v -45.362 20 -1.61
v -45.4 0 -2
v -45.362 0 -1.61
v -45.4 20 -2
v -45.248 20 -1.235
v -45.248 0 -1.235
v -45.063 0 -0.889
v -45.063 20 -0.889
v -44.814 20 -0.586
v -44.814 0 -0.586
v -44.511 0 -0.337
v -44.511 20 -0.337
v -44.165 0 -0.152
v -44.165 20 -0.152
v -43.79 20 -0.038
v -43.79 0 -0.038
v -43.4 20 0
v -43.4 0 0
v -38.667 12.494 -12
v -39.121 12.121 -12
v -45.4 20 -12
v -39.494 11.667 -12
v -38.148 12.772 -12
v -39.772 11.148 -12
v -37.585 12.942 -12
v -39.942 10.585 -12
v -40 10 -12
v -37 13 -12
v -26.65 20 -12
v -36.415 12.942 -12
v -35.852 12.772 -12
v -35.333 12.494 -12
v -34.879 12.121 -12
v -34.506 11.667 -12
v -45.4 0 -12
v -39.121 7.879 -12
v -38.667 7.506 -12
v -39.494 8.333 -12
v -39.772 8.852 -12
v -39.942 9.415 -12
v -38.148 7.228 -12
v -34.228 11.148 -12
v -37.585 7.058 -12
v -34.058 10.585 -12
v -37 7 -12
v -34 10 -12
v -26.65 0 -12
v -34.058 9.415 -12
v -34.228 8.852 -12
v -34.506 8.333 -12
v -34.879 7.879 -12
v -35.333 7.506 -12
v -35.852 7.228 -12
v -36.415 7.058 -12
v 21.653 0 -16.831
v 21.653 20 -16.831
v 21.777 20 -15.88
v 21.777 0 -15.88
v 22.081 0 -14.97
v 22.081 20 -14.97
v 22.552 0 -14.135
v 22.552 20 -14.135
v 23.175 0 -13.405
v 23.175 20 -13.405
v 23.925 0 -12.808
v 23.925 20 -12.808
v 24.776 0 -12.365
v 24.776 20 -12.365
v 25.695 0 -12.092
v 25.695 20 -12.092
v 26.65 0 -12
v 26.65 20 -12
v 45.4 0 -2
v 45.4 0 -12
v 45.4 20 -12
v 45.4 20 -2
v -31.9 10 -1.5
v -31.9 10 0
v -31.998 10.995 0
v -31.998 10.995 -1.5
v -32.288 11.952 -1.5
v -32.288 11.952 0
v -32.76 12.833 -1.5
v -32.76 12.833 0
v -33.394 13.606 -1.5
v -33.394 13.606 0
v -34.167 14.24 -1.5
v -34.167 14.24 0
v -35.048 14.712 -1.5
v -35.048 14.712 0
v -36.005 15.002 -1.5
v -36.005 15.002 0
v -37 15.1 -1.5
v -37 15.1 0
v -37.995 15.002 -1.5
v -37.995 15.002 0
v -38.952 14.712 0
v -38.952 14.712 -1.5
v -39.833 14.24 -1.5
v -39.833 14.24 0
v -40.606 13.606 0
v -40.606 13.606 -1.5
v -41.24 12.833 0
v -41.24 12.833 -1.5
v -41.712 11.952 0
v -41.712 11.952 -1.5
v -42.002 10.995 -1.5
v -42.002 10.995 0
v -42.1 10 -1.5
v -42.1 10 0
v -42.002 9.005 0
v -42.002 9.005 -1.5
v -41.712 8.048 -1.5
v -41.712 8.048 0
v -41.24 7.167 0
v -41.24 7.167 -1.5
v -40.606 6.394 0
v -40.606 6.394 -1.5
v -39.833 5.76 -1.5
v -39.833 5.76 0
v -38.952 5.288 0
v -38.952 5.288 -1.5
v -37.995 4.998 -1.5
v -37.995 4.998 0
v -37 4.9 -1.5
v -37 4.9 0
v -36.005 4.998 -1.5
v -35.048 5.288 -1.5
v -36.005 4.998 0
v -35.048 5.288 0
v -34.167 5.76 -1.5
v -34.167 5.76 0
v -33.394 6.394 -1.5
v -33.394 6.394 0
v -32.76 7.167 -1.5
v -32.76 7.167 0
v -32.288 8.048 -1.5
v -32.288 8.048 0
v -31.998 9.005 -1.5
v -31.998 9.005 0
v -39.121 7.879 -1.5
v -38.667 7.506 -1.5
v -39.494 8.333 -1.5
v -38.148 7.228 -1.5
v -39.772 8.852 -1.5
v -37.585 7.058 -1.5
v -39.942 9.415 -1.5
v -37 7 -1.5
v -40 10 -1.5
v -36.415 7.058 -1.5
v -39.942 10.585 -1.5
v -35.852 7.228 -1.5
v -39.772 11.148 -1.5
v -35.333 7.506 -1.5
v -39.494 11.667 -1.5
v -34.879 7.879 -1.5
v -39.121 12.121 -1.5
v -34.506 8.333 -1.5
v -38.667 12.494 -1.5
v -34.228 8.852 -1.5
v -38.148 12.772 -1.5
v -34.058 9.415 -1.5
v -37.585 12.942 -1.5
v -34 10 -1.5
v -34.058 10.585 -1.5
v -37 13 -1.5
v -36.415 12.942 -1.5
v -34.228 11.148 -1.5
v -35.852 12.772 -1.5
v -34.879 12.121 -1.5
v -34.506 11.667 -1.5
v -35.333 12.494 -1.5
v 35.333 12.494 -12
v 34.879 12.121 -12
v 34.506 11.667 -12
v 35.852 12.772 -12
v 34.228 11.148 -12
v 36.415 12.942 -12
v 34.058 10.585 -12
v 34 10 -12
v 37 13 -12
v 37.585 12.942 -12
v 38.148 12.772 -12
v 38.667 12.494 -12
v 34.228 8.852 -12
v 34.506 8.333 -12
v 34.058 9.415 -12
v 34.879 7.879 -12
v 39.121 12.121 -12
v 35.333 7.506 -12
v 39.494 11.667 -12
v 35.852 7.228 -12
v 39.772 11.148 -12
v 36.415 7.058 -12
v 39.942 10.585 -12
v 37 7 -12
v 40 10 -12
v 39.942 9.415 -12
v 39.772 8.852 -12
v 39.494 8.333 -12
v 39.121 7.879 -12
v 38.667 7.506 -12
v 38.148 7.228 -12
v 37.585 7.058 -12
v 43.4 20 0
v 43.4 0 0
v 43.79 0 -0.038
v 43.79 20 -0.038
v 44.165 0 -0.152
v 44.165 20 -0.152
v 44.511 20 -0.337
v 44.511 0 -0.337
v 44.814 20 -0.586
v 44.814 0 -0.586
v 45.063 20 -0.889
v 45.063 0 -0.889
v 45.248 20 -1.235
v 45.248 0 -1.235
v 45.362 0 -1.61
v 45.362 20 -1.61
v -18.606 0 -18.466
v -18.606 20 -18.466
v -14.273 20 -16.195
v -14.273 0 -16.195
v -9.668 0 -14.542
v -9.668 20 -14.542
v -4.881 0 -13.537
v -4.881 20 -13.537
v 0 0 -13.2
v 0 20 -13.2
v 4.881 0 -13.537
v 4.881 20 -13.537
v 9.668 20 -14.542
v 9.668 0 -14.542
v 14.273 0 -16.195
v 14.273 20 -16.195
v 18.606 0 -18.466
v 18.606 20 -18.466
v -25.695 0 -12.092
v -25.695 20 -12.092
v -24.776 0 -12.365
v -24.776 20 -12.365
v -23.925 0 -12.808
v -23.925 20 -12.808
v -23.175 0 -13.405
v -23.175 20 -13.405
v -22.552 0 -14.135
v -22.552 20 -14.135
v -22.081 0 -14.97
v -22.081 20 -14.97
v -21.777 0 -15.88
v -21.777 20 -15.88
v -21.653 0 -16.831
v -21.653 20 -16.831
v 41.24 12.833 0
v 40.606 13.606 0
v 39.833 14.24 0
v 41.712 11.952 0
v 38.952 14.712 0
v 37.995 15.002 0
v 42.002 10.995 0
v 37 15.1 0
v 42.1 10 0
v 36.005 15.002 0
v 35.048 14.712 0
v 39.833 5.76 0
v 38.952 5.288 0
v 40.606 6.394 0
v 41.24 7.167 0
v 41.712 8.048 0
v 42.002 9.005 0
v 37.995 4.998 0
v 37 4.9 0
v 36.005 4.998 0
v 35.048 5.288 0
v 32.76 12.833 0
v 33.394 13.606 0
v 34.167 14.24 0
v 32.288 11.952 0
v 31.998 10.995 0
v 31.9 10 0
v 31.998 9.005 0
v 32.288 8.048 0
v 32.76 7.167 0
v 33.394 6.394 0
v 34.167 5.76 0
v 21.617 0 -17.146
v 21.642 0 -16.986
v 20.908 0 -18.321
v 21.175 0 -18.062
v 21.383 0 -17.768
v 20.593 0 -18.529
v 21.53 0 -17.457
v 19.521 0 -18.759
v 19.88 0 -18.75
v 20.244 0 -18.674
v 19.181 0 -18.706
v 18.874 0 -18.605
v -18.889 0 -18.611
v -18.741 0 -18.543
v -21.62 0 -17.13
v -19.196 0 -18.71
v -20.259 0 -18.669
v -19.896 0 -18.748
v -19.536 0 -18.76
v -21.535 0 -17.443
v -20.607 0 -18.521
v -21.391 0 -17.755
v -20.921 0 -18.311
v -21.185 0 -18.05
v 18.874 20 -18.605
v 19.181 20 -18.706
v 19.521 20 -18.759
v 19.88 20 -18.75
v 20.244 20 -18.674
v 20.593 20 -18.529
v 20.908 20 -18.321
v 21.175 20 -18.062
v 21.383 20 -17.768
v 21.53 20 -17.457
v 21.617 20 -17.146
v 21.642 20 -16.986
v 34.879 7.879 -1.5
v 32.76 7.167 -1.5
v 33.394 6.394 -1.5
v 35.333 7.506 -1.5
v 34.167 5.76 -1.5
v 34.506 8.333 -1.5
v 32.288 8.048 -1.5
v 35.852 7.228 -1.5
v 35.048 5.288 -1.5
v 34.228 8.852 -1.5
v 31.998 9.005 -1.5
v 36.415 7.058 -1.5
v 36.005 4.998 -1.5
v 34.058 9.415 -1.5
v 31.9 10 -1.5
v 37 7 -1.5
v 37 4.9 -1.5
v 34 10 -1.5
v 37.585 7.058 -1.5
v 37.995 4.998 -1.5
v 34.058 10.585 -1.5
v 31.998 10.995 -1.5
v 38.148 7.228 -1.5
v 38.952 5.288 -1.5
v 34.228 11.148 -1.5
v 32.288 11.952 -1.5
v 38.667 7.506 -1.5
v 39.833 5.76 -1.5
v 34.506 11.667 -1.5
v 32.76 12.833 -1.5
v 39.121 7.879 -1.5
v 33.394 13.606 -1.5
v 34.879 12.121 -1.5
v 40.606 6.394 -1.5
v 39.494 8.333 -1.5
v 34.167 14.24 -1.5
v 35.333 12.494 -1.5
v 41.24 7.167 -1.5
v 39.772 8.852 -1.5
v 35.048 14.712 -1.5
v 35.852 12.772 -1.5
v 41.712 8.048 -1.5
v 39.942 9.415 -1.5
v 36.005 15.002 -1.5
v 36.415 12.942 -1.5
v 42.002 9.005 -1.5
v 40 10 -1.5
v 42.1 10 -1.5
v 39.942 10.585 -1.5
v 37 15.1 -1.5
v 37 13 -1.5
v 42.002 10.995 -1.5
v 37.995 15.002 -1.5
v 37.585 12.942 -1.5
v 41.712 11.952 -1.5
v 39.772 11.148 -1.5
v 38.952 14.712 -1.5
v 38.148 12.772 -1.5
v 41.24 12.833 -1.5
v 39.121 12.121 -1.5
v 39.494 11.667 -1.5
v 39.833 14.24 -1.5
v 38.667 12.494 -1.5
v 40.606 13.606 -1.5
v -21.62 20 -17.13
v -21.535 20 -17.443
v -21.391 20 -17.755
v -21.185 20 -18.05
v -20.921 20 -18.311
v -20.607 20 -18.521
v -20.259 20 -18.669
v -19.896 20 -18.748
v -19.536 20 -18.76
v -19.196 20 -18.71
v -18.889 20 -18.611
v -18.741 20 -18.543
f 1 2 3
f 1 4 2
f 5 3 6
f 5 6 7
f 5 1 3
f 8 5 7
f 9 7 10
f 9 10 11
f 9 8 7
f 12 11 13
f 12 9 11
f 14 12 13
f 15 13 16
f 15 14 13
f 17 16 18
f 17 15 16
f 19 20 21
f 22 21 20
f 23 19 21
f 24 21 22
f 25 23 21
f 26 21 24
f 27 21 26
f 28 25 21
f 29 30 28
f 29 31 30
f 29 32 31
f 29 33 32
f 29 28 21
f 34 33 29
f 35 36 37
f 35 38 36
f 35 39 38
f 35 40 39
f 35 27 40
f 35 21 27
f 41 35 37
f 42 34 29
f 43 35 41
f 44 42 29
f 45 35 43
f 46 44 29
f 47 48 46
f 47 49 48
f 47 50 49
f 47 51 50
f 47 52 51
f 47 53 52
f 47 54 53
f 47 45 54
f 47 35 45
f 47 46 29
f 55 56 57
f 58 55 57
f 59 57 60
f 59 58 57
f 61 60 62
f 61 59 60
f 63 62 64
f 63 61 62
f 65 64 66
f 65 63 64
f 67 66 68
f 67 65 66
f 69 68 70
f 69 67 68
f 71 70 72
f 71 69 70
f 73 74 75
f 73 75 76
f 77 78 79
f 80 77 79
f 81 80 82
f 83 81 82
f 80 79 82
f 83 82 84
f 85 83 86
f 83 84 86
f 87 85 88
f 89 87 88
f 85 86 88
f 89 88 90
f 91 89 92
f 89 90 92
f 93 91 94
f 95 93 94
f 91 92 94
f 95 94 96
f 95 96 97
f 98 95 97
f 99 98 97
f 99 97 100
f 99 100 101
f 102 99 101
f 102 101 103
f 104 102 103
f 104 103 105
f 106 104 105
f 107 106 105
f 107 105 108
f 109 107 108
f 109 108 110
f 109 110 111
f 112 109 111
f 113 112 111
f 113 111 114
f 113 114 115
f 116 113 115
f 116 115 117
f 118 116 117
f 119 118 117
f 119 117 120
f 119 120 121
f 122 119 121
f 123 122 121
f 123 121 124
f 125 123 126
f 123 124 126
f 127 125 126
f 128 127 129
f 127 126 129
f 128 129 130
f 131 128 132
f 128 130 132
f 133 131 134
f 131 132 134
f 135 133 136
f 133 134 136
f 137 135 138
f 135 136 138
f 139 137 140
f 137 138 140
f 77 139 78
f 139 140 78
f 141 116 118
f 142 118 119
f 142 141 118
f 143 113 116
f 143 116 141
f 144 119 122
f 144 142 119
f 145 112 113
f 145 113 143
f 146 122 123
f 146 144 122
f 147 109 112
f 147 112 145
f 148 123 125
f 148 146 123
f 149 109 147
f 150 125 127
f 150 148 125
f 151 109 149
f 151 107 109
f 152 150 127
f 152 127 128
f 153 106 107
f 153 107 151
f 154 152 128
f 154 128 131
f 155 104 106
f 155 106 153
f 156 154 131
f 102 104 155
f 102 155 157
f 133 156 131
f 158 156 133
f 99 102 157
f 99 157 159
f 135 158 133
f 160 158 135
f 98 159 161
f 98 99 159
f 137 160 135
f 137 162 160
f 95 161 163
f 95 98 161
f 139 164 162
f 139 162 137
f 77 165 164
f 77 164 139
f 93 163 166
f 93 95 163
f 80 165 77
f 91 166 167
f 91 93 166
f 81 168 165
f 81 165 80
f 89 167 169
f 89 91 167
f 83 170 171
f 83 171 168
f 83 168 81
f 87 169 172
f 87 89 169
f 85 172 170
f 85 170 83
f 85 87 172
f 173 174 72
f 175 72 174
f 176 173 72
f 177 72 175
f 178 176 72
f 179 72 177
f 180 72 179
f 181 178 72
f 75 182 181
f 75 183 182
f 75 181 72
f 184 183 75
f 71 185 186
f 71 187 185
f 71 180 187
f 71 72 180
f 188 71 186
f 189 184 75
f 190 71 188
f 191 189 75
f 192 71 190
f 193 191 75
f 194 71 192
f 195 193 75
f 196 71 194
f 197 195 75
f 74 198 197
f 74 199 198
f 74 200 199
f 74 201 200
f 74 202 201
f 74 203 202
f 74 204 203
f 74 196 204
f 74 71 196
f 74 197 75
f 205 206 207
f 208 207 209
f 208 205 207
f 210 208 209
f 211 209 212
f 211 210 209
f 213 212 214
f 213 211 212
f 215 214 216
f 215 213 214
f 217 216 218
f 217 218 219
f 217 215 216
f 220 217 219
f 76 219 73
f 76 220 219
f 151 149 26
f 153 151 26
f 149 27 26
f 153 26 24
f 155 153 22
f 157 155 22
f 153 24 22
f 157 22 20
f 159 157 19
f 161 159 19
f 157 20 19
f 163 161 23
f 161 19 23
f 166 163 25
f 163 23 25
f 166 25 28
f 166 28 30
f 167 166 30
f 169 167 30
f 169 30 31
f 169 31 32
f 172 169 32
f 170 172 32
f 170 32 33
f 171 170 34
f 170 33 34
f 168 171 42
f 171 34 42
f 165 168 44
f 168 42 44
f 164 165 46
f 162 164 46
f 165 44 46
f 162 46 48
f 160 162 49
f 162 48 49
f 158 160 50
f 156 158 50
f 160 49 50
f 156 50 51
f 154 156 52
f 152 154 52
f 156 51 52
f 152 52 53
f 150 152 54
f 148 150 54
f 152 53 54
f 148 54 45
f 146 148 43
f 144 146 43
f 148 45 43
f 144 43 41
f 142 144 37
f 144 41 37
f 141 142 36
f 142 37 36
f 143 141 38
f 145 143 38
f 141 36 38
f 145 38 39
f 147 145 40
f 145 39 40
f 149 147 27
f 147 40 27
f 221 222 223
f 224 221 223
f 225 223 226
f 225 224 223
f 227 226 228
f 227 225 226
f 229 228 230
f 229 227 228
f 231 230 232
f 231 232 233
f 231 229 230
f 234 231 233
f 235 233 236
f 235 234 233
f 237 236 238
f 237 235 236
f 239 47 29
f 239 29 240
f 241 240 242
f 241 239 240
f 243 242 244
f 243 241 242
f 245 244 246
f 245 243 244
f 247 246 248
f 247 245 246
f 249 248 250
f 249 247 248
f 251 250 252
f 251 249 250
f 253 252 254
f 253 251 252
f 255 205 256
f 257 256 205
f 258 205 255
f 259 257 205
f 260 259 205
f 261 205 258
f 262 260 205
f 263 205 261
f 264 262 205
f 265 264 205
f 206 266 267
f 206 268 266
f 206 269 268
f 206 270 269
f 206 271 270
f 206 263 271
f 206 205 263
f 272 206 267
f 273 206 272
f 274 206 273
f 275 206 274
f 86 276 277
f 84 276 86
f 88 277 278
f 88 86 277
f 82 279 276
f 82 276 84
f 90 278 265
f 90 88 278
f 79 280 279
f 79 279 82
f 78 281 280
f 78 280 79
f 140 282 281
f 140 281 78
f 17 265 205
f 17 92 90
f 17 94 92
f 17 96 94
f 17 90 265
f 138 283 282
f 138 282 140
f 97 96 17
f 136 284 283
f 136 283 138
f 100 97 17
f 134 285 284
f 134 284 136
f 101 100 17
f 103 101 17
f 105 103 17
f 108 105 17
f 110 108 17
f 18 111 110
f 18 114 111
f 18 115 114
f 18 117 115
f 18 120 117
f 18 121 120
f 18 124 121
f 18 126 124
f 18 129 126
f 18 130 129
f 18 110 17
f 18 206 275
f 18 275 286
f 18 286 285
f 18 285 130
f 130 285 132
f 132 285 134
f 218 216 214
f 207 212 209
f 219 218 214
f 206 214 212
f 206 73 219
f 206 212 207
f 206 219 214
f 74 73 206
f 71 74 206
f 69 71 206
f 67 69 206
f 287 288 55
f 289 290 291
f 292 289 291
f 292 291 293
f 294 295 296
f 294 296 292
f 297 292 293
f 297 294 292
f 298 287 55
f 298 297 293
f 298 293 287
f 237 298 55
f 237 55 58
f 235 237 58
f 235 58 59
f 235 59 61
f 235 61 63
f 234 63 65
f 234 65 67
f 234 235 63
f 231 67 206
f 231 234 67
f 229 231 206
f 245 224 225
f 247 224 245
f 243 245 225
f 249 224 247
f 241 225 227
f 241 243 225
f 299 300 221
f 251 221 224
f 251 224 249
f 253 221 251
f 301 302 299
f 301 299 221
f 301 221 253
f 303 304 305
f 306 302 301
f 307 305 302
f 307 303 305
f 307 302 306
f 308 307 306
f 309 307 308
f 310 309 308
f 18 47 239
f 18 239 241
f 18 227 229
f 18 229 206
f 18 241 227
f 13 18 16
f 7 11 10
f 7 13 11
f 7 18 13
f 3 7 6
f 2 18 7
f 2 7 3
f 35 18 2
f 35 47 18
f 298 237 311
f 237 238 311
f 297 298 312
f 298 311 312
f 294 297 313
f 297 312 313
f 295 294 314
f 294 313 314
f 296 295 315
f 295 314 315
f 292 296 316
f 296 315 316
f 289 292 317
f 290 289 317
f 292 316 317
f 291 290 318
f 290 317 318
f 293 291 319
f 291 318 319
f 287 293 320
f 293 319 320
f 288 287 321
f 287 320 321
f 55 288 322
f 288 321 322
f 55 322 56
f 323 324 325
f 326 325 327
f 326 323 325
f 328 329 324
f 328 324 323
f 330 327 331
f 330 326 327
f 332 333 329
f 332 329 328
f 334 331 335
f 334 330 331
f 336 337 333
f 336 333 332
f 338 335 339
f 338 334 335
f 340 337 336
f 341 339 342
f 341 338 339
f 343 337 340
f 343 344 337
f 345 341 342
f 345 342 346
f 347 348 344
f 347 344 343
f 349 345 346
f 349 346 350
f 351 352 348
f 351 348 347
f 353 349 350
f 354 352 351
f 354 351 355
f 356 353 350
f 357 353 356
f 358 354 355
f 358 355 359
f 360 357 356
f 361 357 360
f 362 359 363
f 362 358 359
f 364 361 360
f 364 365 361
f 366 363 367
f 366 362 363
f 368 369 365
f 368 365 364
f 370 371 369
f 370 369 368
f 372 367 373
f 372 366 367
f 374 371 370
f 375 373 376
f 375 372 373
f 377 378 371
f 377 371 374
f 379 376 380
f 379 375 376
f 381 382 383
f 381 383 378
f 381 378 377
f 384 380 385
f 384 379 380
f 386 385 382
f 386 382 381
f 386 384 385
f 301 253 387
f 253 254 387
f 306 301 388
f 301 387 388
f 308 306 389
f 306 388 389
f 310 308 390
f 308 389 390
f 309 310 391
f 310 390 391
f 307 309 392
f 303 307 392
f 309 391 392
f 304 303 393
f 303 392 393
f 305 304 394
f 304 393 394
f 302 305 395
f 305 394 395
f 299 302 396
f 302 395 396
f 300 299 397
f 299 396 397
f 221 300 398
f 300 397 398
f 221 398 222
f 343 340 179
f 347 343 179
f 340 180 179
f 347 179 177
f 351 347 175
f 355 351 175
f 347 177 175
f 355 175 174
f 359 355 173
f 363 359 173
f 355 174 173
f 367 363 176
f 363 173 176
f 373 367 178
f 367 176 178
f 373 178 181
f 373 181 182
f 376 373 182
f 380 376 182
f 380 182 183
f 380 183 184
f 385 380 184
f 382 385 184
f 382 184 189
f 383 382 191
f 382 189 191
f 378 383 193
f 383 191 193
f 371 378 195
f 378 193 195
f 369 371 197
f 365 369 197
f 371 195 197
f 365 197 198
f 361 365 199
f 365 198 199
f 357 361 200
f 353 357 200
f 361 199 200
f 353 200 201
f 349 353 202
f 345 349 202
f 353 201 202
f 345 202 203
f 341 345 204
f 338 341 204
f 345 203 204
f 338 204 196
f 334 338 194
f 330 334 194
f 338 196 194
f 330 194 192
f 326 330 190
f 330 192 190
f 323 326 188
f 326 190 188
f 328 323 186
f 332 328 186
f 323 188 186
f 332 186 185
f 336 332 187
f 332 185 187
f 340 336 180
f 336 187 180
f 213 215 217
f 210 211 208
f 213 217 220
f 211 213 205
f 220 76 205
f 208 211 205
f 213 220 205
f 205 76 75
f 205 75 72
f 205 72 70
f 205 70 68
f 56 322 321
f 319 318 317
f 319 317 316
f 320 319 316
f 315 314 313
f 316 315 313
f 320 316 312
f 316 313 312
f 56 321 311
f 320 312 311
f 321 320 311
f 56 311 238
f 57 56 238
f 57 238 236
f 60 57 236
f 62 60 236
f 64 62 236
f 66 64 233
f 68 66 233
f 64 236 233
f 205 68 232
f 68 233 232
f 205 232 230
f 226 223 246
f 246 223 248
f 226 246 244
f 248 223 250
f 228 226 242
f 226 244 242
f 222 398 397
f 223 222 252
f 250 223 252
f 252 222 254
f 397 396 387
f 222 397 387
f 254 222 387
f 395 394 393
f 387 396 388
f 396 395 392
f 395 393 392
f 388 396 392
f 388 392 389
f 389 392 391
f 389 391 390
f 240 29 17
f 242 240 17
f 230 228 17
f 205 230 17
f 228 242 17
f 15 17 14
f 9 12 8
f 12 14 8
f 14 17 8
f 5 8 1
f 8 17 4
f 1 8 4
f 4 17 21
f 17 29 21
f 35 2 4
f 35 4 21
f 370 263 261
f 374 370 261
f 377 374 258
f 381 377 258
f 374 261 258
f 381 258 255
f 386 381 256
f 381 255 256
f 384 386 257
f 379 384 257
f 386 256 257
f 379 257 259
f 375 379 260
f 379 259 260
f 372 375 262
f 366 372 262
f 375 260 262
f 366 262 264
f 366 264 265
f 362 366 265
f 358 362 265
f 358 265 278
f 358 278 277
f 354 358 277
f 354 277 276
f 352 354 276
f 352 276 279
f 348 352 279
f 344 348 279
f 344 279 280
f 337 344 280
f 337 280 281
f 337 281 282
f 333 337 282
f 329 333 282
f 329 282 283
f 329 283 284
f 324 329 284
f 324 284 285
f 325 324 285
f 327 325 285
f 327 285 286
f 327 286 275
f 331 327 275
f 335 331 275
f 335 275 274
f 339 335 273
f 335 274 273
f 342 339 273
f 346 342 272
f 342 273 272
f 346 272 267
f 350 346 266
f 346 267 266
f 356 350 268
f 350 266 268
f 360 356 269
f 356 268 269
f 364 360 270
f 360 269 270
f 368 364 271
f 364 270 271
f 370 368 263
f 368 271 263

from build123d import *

# Parameters (mm, degrees)
BOSS_EXTRUDE1_DEPTH = 20
FILLET1_R           = 2
HOLE1_D             = 6
HOLE1_DEPTH         = 20.26
HOLE1_CBORE_D       = 10.2
HOLE1_CBORE_DEPTH   = 1.5
HOLE1_TIP           = 1.802581857
FILLET2_R           = 2


with BuildPart() as part:
    # Sketch1 → Boss-Extrude1 (new body)
    with BuildSketch(Plane(origin=(0, 0, 0), x_dir=(1, 0, 0), z_dir=(0, 1, 0))):
        with BuildLine():
            Line((45.4, 0), (-45.4, 0))
            Line((-45.4, 0), (-45.4, 12))
            Line((-45.4, 12), (-26.65, 12))
            ThreePointArc((-26.65, 12), (-23.114466094, 13.464466094), (-21.65, 17))
            Line((-21.65, 17), (-21.65, 20.565901472))
            ThreePointArc((-21.65, 20.565901472), (0, 13.2), (21.65, 20.565901472))
            Line((21.65, 20.565901472), (21.65, 17))
            ThreePointArc((21.65, 17), (23.114466094, 13.464466094), (26.65, 12))
            Line((26.65, 12), (45.4, 12))
            Line((45.4, 12), (45.4, 0))
        make_face()
    extrude(amount=BOSS_EXTRUDE1_DEPTH)

    # Fillet1
    fillet1_edges = [part.edges().sort_by_distance(p)[0] for p in [
        (21.65, 10, -20.565901472),
        (-21.65, 10, -20.565901472),
    ]]
    fillet(fillet1_edges, radius=FILLET1_R)

    # Hole1
    with Locations(Plane.XY):
        with Locations((-37, 10), (37, 10)):
            CounterBoreHole(HOLE1_D / 2, HOLE1_CBORE_D / 2, HOLE1_CBORE_DEPTH, depth=HOLE1_DEPTH)
            with Locations((0, 0, -(HOLE1_DEPTH + HOLE1_TIP / 2))):  # 118° drill point
                Cone(0, HOLE1_D / 2, HOLE1_TIP, mode=Mode.SUBTRACT)

    # Fillet2
    fillet2_edges = [part.edges().sort_by_distance(p)[0] for p in [
        (45.4, 10, 0),
        (-45.4, 10, 0),
    ]]
    fillet(fillet2_edges, radius=FILLET2_R)


solid = part.part
